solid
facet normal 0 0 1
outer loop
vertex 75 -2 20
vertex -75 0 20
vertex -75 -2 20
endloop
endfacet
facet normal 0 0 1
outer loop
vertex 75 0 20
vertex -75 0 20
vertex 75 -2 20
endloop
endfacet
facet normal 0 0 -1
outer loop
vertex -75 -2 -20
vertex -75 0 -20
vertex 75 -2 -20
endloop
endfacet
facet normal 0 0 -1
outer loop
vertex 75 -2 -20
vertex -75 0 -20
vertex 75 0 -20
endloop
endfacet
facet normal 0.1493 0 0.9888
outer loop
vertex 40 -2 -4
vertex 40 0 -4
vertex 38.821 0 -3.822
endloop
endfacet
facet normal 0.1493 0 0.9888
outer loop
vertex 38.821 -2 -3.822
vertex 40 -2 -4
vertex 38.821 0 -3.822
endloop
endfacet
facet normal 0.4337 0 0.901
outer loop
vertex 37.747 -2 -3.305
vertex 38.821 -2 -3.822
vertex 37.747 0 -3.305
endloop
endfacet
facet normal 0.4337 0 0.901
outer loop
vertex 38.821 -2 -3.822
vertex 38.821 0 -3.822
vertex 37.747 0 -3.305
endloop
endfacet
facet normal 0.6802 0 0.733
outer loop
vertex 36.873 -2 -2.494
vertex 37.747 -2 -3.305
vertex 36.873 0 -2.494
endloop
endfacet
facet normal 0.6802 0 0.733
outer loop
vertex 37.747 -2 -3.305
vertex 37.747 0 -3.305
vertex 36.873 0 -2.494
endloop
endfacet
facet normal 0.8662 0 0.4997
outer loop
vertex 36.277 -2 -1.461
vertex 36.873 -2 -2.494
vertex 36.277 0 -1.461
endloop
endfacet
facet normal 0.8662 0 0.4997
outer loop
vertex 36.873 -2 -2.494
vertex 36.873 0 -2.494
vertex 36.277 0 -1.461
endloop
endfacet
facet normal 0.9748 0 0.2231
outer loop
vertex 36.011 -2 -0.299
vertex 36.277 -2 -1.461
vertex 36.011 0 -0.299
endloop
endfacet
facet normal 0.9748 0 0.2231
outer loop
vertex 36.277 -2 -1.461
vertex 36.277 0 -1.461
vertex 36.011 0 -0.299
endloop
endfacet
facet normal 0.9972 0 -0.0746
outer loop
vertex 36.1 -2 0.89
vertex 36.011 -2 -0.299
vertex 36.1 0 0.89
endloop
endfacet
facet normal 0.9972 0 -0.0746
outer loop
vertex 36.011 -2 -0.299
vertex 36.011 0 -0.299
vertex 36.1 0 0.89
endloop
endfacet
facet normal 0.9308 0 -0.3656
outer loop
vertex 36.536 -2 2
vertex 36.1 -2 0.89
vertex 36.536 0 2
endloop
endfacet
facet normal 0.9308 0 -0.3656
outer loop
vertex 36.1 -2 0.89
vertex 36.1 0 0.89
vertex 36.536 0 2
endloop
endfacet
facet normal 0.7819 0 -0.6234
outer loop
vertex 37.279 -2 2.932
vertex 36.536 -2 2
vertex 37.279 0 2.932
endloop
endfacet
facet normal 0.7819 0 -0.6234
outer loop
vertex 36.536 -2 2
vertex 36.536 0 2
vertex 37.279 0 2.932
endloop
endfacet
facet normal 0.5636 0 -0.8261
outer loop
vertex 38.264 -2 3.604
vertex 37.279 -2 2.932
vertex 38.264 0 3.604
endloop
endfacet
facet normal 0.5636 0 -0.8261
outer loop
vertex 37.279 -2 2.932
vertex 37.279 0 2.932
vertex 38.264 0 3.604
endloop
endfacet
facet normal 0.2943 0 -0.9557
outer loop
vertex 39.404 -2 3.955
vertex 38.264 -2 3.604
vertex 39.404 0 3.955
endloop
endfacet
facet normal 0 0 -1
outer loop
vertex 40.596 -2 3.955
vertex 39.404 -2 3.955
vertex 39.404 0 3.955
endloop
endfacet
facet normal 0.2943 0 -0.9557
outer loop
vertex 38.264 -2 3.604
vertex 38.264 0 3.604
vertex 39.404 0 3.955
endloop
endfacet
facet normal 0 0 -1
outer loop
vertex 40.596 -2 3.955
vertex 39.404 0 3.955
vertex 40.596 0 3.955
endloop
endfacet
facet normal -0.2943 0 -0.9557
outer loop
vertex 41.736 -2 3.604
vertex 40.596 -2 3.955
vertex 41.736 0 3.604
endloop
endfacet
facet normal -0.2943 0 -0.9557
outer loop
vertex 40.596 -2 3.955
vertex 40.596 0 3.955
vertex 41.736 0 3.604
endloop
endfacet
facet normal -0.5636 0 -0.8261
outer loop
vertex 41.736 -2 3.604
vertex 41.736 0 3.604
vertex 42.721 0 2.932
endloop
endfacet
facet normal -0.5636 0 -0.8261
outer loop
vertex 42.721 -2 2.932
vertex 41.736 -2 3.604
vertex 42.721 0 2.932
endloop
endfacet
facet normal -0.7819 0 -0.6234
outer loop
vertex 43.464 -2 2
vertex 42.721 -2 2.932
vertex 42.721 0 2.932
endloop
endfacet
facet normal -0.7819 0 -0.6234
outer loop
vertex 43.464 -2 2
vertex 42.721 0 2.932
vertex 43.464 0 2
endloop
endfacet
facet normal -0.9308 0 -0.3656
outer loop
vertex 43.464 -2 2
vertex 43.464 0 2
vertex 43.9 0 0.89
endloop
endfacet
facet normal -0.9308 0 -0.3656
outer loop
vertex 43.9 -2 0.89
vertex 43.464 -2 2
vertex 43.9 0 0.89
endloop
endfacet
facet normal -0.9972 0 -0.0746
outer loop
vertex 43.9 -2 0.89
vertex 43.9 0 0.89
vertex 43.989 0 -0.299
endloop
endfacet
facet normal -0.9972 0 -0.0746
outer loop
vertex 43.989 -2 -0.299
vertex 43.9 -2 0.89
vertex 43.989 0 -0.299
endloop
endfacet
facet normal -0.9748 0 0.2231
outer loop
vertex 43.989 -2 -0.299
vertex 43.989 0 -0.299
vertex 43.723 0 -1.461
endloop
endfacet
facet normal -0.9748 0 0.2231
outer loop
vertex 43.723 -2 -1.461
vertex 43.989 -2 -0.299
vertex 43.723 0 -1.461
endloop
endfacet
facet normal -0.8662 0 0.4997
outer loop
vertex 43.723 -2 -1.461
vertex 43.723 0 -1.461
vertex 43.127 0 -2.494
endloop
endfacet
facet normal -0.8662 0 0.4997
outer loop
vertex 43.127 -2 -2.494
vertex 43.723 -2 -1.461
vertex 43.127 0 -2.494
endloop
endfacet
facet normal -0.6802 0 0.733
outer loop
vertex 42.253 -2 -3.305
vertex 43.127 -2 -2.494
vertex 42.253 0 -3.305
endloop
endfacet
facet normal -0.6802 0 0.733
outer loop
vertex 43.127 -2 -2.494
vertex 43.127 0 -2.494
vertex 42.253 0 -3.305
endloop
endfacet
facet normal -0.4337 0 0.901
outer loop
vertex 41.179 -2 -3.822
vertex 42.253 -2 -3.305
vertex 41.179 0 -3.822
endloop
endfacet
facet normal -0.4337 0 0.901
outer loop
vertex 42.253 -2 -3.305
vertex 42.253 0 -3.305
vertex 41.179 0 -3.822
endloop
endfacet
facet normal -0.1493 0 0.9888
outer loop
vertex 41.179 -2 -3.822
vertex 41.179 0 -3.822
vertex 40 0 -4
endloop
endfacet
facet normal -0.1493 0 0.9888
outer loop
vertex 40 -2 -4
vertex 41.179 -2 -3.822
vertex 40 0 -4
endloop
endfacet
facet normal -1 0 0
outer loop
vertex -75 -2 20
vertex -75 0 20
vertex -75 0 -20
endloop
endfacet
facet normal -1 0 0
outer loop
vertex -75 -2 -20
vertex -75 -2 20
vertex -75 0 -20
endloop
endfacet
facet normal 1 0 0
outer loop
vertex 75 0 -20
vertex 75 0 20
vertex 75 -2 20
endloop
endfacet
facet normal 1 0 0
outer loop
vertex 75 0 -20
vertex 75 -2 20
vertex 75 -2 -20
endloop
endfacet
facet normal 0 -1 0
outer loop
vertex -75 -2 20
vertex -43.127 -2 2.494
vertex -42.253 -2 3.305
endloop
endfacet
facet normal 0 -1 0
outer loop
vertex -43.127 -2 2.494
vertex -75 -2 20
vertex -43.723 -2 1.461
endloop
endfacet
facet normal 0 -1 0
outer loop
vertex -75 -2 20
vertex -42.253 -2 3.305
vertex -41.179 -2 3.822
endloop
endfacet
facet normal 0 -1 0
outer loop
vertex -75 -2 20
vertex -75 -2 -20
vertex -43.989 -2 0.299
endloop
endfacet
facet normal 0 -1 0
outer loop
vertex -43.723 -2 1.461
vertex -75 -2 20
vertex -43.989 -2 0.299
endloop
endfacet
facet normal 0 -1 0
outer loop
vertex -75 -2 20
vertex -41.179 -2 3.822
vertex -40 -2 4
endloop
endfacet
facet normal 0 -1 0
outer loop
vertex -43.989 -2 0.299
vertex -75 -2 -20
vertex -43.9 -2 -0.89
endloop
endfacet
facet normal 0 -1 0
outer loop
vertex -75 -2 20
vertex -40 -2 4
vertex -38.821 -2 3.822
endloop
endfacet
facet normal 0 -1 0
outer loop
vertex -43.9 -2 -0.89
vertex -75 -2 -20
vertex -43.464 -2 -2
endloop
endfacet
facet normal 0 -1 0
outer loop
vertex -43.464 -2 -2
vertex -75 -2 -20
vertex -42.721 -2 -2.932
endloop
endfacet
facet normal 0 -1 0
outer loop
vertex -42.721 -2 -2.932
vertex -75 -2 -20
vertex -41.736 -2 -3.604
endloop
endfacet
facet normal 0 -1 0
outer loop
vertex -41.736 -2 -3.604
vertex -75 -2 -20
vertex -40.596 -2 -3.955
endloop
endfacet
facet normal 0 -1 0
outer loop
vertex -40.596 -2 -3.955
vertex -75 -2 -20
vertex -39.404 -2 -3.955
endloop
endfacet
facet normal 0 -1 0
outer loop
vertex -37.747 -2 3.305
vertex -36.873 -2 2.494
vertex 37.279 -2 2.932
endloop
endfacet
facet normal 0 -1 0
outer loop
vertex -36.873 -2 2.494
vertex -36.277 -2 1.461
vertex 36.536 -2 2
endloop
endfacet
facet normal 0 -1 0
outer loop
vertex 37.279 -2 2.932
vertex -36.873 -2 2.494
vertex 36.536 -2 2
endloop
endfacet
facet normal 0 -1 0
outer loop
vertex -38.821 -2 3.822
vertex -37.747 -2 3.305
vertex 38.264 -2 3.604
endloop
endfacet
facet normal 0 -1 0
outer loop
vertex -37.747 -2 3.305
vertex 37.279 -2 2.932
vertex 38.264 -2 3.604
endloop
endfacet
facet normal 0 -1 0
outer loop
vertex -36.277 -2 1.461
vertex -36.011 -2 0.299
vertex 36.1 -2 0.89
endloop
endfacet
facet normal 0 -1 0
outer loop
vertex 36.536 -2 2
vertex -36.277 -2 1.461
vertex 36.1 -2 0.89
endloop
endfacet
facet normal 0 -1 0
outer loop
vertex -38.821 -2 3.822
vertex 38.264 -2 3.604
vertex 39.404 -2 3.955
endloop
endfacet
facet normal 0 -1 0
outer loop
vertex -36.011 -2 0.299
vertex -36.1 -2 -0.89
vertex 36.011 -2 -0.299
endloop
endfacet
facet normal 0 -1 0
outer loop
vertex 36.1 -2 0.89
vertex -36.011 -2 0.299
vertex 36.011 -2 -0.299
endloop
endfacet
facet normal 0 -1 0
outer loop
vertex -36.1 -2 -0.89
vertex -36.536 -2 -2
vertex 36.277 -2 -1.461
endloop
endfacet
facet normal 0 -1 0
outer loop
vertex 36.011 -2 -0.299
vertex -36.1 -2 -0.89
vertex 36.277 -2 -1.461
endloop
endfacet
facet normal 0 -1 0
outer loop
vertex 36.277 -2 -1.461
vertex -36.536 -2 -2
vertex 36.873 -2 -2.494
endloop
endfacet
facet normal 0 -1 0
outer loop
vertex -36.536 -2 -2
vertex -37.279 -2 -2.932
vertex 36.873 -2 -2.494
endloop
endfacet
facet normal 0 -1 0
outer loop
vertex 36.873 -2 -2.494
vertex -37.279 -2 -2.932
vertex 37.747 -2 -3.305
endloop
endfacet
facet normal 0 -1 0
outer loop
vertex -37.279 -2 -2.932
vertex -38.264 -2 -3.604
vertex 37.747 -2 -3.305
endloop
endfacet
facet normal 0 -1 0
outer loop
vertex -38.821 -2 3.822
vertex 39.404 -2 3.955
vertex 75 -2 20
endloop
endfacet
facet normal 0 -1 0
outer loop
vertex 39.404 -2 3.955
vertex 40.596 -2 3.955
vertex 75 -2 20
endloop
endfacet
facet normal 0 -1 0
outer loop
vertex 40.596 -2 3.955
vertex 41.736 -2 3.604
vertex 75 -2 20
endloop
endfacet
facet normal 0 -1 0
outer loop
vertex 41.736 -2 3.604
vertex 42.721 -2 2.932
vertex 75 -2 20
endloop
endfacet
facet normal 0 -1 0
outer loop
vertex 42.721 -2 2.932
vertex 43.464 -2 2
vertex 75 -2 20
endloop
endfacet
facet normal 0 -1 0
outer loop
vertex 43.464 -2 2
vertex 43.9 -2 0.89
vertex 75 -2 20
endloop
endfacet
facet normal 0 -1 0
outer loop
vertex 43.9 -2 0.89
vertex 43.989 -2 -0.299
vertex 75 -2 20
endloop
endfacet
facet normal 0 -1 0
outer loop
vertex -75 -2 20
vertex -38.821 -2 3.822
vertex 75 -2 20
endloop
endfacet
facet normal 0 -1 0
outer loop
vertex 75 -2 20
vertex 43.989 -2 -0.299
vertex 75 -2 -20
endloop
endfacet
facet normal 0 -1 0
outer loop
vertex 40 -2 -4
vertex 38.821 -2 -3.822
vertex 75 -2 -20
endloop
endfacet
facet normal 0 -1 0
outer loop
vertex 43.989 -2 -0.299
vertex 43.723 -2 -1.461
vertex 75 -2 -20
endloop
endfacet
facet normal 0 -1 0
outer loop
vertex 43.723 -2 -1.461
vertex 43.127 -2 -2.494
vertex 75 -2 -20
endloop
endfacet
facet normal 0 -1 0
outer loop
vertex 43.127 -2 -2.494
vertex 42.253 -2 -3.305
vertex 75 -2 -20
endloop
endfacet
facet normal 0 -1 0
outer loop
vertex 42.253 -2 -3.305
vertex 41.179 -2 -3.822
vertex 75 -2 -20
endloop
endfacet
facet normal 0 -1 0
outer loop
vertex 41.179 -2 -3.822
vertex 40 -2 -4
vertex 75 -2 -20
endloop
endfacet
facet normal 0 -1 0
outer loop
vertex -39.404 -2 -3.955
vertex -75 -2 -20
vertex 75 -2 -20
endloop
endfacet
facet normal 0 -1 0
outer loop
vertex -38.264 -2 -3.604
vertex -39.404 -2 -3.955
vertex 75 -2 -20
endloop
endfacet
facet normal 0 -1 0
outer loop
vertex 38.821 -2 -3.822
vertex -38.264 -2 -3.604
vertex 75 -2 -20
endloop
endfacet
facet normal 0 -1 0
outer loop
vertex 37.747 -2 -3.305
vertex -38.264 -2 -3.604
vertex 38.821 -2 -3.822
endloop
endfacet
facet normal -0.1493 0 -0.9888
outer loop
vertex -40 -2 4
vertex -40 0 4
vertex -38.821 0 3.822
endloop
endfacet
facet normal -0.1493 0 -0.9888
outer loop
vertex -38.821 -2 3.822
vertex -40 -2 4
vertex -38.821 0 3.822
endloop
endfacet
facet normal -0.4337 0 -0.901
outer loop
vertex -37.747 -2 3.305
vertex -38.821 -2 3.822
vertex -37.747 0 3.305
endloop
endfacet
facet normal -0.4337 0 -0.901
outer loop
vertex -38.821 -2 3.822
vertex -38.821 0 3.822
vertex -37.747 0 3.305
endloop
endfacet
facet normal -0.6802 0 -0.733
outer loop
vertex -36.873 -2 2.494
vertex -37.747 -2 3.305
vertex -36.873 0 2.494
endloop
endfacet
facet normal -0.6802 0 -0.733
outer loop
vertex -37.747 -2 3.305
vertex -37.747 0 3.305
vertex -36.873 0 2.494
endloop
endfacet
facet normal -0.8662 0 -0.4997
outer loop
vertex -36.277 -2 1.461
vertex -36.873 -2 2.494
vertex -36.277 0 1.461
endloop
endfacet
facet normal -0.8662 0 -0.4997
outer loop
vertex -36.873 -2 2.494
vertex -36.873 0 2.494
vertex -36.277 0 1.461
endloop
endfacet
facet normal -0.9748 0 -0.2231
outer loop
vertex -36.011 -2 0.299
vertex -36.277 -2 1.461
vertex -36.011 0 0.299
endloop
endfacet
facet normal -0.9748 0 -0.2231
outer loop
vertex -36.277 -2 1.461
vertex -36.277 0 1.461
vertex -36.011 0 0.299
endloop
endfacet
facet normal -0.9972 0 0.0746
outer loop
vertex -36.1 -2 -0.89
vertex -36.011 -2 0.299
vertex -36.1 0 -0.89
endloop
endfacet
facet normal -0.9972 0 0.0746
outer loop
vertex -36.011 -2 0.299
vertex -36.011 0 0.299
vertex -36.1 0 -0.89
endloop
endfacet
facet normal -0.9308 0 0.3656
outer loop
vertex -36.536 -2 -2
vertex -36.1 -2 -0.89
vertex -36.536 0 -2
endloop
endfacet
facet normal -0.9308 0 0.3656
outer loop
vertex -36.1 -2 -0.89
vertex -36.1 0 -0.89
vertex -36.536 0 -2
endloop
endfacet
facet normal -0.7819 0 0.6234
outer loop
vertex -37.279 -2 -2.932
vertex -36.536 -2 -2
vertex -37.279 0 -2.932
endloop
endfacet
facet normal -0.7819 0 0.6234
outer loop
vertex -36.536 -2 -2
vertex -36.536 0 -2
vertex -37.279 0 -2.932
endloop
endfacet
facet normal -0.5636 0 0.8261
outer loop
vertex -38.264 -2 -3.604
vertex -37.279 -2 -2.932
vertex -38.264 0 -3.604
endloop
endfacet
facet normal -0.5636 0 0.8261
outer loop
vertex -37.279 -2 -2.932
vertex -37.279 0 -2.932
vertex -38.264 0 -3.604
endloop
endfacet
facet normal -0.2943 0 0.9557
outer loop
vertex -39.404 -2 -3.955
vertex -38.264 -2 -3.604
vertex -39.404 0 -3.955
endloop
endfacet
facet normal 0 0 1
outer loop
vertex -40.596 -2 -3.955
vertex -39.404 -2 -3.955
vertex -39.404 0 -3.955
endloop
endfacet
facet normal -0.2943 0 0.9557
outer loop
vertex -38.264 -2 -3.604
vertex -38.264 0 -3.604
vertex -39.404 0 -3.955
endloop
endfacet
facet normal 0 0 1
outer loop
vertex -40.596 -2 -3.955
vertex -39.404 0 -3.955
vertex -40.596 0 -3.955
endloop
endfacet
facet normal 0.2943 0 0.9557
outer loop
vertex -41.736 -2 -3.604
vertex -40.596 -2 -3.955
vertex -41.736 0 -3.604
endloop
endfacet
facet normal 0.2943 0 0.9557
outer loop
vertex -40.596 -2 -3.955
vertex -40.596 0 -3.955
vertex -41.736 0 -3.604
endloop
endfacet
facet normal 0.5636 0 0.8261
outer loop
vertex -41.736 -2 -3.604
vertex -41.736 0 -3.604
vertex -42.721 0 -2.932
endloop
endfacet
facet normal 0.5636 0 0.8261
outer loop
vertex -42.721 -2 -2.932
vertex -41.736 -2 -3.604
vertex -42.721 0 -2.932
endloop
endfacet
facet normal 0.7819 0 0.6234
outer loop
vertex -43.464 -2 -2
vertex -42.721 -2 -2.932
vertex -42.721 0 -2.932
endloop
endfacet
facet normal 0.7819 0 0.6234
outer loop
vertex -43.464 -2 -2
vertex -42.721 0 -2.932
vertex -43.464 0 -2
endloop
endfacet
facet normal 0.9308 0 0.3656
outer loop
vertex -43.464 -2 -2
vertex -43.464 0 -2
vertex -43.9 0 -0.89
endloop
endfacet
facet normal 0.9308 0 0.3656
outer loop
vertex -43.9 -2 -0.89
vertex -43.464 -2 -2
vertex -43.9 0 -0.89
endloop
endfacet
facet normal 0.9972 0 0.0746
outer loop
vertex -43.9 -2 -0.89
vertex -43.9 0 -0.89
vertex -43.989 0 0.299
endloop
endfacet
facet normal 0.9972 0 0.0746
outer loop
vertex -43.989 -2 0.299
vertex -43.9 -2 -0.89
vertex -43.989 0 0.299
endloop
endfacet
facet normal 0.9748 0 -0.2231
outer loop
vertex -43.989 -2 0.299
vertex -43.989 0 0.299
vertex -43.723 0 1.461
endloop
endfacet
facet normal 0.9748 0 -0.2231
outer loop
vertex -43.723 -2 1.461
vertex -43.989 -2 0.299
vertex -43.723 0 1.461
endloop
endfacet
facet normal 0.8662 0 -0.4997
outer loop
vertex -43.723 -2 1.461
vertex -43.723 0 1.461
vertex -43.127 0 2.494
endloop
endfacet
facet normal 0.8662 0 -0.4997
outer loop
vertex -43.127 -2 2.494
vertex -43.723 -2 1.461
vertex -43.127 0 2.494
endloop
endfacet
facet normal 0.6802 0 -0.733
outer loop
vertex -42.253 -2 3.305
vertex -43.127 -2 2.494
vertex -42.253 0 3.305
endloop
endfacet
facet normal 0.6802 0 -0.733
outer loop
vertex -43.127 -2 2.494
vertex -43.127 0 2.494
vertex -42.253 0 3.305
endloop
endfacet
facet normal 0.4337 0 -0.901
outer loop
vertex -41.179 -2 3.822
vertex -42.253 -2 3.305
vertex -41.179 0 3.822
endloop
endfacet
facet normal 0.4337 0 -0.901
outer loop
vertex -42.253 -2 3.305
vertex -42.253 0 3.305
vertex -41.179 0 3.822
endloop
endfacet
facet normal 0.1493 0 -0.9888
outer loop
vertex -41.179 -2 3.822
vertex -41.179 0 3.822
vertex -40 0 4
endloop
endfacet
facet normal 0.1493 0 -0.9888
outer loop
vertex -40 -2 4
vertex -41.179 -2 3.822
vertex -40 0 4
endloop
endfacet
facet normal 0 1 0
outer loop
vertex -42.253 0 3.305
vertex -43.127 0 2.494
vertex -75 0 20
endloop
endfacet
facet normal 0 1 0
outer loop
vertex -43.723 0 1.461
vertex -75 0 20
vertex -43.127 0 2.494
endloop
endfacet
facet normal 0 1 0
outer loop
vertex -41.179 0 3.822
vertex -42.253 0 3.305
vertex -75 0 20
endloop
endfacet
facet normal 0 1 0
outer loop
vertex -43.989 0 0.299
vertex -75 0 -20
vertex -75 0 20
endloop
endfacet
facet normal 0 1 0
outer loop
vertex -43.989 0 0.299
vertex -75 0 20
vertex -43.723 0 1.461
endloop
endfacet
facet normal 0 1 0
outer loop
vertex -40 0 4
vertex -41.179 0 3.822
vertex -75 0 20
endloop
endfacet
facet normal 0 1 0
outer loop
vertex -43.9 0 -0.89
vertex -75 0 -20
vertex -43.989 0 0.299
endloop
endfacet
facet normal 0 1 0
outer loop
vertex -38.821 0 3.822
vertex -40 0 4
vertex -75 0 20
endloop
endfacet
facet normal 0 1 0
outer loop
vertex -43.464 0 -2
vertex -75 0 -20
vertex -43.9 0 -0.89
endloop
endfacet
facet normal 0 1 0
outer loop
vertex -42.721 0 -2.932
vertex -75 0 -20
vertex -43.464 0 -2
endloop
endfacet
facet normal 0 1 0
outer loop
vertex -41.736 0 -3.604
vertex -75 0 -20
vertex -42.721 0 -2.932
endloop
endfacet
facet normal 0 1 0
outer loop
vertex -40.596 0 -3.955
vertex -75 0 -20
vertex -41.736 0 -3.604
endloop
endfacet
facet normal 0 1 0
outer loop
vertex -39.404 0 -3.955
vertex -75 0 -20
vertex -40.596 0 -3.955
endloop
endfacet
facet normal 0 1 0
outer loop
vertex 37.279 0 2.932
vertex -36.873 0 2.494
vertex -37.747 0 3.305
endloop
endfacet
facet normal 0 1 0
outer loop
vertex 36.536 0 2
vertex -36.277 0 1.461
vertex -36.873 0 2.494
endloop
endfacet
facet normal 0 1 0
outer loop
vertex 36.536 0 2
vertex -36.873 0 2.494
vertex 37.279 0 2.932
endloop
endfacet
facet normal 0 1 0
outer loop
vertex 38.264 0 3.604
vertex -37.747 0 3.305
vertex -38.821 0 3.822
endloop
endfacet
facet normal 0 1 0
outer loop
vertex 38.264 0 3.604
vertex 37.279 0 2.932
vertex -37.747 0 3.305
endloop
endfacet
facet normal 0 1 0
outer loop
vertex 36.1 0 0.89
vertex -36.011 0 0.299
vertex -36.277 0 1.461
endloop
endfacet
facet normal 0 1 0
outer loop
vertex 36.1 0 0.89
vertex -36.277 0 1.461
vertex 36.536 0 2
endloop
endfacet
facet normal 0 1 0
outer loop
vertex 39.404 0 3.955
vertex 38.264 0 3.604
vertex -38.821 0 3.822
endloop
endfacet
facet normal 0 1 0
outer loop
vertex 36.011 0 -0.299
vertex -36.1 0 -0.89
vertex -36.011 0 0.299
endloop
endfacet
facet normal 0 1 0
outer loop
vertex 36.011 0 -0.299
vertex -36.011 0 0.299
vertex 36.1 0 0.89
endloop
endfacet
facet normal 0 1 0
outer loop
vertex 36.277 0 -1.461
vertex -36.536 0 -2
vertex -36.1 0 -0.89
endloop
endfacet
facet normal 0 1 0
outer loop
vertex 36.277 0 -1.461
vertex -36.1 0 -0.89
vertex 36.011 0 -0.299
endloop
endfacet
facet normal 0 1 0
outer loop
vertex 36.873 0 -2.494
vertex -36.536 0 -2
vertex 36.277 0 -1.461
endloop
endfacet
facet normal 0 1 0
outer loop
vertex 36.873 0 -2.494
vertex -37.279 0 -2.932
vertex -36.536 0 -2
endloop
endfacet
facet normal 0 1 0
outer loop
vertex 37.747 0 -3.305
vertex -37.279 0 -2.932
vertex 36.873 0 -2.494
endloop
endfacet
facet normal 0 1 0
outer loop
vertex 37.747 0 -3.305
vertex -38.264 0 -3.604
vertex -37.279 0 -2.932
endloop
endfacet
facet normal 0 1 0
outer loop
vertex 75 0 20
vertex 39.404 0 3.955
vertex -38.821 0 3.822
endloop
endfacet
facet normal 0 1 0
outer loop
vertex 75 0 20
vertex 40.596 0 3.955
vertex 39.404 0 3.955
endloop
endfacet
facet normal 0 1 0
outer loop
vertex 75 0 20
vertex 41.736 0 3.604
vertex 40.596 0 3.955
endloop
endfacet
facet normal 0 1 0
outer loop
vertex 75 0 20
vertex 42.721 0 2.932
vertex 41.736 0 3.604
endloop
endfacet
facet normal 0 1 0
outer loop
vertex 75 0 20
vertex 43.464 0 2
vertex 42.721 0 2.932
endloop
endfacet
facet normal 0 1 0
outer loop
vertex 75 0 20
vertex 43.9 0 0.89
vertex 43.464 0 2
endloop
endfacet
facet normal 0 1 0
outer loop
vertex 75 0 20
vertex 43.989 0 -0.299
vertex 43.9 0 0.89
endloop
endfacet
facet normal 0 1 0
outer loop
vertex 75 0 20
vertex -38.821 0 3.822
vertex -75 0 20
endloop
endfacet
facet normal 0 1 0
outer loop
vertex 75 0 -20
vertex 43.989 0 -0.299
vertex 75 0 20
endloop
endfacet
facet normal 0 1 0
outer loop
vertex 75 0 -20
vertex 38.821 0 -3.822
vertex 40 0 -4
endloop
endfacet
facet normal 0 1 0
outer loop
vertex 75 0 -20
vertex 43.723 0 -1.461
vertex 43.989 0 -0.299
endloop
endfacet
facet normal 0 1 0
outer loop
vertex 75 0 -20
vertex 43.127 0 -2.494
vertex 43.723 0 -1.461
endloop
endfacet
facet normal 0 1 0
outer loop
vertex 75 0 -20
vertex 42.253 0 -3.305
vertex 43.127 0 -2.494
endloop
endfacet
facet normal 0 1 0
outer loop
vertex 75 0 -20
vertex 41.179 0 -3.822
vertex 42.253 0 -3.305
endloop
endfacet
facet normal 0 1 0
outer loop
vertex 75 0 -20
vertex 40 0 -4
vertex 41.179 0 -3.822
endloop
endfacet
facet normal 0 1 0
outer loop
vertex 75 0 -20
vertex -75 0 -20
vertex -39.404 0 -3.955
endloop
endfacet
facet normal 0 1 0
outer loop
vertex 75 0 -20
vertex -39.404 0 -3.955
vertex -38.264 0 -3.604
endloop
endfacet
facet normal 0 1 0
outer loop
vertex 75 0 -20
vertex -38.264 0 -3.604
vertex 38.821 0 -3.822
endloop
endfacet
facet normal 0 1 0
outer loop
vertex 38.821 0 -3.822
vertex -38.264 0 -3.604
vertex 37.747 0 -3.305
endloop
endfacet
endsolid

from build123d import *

# Parameters (mm, degrees)
SKETCH1_W          = 150
SKETCH1_H          = 40
BASE_FLANGE1_DEPTH = 2
SKETCH4_R          = 4
CUT_EXTRUDE1_DEPTH = 2


# Sheet-metal steps are written as plain solids
with BuildPart() as part:
    # Sketch1 → Base-Flange1 (new body)
    with BuildSketch(Plane(origin=(0, 0, 0), x_dir=(1, 0, 0), z_dir=(0, 1, 0))):
        Rectangle(SKETCH1_W, SKETCH1_H)
    extrude(amount=-BASE_FLANGE1_DEPTH)

    # Sketch4 → Cut-Extrude1 (cut)
    with BuildSketch(Plane(origin=(0, 0, 0), x_dir=(1, 0, 0), z_dir=(0, 1, 0))):
        with Locations(Location((-40, 0, 0), (0, 0, 270))):
            Circle(SKETCH4_R)
        with Locations(Location((40, 0, 0), (0, 0, 90))):
            Circle(SKETCH4_R)
    extrude(amount=-CUT_EXTRUDE1_DEPTH, mode=Mode.SUBTRACT)


solid = part.part
